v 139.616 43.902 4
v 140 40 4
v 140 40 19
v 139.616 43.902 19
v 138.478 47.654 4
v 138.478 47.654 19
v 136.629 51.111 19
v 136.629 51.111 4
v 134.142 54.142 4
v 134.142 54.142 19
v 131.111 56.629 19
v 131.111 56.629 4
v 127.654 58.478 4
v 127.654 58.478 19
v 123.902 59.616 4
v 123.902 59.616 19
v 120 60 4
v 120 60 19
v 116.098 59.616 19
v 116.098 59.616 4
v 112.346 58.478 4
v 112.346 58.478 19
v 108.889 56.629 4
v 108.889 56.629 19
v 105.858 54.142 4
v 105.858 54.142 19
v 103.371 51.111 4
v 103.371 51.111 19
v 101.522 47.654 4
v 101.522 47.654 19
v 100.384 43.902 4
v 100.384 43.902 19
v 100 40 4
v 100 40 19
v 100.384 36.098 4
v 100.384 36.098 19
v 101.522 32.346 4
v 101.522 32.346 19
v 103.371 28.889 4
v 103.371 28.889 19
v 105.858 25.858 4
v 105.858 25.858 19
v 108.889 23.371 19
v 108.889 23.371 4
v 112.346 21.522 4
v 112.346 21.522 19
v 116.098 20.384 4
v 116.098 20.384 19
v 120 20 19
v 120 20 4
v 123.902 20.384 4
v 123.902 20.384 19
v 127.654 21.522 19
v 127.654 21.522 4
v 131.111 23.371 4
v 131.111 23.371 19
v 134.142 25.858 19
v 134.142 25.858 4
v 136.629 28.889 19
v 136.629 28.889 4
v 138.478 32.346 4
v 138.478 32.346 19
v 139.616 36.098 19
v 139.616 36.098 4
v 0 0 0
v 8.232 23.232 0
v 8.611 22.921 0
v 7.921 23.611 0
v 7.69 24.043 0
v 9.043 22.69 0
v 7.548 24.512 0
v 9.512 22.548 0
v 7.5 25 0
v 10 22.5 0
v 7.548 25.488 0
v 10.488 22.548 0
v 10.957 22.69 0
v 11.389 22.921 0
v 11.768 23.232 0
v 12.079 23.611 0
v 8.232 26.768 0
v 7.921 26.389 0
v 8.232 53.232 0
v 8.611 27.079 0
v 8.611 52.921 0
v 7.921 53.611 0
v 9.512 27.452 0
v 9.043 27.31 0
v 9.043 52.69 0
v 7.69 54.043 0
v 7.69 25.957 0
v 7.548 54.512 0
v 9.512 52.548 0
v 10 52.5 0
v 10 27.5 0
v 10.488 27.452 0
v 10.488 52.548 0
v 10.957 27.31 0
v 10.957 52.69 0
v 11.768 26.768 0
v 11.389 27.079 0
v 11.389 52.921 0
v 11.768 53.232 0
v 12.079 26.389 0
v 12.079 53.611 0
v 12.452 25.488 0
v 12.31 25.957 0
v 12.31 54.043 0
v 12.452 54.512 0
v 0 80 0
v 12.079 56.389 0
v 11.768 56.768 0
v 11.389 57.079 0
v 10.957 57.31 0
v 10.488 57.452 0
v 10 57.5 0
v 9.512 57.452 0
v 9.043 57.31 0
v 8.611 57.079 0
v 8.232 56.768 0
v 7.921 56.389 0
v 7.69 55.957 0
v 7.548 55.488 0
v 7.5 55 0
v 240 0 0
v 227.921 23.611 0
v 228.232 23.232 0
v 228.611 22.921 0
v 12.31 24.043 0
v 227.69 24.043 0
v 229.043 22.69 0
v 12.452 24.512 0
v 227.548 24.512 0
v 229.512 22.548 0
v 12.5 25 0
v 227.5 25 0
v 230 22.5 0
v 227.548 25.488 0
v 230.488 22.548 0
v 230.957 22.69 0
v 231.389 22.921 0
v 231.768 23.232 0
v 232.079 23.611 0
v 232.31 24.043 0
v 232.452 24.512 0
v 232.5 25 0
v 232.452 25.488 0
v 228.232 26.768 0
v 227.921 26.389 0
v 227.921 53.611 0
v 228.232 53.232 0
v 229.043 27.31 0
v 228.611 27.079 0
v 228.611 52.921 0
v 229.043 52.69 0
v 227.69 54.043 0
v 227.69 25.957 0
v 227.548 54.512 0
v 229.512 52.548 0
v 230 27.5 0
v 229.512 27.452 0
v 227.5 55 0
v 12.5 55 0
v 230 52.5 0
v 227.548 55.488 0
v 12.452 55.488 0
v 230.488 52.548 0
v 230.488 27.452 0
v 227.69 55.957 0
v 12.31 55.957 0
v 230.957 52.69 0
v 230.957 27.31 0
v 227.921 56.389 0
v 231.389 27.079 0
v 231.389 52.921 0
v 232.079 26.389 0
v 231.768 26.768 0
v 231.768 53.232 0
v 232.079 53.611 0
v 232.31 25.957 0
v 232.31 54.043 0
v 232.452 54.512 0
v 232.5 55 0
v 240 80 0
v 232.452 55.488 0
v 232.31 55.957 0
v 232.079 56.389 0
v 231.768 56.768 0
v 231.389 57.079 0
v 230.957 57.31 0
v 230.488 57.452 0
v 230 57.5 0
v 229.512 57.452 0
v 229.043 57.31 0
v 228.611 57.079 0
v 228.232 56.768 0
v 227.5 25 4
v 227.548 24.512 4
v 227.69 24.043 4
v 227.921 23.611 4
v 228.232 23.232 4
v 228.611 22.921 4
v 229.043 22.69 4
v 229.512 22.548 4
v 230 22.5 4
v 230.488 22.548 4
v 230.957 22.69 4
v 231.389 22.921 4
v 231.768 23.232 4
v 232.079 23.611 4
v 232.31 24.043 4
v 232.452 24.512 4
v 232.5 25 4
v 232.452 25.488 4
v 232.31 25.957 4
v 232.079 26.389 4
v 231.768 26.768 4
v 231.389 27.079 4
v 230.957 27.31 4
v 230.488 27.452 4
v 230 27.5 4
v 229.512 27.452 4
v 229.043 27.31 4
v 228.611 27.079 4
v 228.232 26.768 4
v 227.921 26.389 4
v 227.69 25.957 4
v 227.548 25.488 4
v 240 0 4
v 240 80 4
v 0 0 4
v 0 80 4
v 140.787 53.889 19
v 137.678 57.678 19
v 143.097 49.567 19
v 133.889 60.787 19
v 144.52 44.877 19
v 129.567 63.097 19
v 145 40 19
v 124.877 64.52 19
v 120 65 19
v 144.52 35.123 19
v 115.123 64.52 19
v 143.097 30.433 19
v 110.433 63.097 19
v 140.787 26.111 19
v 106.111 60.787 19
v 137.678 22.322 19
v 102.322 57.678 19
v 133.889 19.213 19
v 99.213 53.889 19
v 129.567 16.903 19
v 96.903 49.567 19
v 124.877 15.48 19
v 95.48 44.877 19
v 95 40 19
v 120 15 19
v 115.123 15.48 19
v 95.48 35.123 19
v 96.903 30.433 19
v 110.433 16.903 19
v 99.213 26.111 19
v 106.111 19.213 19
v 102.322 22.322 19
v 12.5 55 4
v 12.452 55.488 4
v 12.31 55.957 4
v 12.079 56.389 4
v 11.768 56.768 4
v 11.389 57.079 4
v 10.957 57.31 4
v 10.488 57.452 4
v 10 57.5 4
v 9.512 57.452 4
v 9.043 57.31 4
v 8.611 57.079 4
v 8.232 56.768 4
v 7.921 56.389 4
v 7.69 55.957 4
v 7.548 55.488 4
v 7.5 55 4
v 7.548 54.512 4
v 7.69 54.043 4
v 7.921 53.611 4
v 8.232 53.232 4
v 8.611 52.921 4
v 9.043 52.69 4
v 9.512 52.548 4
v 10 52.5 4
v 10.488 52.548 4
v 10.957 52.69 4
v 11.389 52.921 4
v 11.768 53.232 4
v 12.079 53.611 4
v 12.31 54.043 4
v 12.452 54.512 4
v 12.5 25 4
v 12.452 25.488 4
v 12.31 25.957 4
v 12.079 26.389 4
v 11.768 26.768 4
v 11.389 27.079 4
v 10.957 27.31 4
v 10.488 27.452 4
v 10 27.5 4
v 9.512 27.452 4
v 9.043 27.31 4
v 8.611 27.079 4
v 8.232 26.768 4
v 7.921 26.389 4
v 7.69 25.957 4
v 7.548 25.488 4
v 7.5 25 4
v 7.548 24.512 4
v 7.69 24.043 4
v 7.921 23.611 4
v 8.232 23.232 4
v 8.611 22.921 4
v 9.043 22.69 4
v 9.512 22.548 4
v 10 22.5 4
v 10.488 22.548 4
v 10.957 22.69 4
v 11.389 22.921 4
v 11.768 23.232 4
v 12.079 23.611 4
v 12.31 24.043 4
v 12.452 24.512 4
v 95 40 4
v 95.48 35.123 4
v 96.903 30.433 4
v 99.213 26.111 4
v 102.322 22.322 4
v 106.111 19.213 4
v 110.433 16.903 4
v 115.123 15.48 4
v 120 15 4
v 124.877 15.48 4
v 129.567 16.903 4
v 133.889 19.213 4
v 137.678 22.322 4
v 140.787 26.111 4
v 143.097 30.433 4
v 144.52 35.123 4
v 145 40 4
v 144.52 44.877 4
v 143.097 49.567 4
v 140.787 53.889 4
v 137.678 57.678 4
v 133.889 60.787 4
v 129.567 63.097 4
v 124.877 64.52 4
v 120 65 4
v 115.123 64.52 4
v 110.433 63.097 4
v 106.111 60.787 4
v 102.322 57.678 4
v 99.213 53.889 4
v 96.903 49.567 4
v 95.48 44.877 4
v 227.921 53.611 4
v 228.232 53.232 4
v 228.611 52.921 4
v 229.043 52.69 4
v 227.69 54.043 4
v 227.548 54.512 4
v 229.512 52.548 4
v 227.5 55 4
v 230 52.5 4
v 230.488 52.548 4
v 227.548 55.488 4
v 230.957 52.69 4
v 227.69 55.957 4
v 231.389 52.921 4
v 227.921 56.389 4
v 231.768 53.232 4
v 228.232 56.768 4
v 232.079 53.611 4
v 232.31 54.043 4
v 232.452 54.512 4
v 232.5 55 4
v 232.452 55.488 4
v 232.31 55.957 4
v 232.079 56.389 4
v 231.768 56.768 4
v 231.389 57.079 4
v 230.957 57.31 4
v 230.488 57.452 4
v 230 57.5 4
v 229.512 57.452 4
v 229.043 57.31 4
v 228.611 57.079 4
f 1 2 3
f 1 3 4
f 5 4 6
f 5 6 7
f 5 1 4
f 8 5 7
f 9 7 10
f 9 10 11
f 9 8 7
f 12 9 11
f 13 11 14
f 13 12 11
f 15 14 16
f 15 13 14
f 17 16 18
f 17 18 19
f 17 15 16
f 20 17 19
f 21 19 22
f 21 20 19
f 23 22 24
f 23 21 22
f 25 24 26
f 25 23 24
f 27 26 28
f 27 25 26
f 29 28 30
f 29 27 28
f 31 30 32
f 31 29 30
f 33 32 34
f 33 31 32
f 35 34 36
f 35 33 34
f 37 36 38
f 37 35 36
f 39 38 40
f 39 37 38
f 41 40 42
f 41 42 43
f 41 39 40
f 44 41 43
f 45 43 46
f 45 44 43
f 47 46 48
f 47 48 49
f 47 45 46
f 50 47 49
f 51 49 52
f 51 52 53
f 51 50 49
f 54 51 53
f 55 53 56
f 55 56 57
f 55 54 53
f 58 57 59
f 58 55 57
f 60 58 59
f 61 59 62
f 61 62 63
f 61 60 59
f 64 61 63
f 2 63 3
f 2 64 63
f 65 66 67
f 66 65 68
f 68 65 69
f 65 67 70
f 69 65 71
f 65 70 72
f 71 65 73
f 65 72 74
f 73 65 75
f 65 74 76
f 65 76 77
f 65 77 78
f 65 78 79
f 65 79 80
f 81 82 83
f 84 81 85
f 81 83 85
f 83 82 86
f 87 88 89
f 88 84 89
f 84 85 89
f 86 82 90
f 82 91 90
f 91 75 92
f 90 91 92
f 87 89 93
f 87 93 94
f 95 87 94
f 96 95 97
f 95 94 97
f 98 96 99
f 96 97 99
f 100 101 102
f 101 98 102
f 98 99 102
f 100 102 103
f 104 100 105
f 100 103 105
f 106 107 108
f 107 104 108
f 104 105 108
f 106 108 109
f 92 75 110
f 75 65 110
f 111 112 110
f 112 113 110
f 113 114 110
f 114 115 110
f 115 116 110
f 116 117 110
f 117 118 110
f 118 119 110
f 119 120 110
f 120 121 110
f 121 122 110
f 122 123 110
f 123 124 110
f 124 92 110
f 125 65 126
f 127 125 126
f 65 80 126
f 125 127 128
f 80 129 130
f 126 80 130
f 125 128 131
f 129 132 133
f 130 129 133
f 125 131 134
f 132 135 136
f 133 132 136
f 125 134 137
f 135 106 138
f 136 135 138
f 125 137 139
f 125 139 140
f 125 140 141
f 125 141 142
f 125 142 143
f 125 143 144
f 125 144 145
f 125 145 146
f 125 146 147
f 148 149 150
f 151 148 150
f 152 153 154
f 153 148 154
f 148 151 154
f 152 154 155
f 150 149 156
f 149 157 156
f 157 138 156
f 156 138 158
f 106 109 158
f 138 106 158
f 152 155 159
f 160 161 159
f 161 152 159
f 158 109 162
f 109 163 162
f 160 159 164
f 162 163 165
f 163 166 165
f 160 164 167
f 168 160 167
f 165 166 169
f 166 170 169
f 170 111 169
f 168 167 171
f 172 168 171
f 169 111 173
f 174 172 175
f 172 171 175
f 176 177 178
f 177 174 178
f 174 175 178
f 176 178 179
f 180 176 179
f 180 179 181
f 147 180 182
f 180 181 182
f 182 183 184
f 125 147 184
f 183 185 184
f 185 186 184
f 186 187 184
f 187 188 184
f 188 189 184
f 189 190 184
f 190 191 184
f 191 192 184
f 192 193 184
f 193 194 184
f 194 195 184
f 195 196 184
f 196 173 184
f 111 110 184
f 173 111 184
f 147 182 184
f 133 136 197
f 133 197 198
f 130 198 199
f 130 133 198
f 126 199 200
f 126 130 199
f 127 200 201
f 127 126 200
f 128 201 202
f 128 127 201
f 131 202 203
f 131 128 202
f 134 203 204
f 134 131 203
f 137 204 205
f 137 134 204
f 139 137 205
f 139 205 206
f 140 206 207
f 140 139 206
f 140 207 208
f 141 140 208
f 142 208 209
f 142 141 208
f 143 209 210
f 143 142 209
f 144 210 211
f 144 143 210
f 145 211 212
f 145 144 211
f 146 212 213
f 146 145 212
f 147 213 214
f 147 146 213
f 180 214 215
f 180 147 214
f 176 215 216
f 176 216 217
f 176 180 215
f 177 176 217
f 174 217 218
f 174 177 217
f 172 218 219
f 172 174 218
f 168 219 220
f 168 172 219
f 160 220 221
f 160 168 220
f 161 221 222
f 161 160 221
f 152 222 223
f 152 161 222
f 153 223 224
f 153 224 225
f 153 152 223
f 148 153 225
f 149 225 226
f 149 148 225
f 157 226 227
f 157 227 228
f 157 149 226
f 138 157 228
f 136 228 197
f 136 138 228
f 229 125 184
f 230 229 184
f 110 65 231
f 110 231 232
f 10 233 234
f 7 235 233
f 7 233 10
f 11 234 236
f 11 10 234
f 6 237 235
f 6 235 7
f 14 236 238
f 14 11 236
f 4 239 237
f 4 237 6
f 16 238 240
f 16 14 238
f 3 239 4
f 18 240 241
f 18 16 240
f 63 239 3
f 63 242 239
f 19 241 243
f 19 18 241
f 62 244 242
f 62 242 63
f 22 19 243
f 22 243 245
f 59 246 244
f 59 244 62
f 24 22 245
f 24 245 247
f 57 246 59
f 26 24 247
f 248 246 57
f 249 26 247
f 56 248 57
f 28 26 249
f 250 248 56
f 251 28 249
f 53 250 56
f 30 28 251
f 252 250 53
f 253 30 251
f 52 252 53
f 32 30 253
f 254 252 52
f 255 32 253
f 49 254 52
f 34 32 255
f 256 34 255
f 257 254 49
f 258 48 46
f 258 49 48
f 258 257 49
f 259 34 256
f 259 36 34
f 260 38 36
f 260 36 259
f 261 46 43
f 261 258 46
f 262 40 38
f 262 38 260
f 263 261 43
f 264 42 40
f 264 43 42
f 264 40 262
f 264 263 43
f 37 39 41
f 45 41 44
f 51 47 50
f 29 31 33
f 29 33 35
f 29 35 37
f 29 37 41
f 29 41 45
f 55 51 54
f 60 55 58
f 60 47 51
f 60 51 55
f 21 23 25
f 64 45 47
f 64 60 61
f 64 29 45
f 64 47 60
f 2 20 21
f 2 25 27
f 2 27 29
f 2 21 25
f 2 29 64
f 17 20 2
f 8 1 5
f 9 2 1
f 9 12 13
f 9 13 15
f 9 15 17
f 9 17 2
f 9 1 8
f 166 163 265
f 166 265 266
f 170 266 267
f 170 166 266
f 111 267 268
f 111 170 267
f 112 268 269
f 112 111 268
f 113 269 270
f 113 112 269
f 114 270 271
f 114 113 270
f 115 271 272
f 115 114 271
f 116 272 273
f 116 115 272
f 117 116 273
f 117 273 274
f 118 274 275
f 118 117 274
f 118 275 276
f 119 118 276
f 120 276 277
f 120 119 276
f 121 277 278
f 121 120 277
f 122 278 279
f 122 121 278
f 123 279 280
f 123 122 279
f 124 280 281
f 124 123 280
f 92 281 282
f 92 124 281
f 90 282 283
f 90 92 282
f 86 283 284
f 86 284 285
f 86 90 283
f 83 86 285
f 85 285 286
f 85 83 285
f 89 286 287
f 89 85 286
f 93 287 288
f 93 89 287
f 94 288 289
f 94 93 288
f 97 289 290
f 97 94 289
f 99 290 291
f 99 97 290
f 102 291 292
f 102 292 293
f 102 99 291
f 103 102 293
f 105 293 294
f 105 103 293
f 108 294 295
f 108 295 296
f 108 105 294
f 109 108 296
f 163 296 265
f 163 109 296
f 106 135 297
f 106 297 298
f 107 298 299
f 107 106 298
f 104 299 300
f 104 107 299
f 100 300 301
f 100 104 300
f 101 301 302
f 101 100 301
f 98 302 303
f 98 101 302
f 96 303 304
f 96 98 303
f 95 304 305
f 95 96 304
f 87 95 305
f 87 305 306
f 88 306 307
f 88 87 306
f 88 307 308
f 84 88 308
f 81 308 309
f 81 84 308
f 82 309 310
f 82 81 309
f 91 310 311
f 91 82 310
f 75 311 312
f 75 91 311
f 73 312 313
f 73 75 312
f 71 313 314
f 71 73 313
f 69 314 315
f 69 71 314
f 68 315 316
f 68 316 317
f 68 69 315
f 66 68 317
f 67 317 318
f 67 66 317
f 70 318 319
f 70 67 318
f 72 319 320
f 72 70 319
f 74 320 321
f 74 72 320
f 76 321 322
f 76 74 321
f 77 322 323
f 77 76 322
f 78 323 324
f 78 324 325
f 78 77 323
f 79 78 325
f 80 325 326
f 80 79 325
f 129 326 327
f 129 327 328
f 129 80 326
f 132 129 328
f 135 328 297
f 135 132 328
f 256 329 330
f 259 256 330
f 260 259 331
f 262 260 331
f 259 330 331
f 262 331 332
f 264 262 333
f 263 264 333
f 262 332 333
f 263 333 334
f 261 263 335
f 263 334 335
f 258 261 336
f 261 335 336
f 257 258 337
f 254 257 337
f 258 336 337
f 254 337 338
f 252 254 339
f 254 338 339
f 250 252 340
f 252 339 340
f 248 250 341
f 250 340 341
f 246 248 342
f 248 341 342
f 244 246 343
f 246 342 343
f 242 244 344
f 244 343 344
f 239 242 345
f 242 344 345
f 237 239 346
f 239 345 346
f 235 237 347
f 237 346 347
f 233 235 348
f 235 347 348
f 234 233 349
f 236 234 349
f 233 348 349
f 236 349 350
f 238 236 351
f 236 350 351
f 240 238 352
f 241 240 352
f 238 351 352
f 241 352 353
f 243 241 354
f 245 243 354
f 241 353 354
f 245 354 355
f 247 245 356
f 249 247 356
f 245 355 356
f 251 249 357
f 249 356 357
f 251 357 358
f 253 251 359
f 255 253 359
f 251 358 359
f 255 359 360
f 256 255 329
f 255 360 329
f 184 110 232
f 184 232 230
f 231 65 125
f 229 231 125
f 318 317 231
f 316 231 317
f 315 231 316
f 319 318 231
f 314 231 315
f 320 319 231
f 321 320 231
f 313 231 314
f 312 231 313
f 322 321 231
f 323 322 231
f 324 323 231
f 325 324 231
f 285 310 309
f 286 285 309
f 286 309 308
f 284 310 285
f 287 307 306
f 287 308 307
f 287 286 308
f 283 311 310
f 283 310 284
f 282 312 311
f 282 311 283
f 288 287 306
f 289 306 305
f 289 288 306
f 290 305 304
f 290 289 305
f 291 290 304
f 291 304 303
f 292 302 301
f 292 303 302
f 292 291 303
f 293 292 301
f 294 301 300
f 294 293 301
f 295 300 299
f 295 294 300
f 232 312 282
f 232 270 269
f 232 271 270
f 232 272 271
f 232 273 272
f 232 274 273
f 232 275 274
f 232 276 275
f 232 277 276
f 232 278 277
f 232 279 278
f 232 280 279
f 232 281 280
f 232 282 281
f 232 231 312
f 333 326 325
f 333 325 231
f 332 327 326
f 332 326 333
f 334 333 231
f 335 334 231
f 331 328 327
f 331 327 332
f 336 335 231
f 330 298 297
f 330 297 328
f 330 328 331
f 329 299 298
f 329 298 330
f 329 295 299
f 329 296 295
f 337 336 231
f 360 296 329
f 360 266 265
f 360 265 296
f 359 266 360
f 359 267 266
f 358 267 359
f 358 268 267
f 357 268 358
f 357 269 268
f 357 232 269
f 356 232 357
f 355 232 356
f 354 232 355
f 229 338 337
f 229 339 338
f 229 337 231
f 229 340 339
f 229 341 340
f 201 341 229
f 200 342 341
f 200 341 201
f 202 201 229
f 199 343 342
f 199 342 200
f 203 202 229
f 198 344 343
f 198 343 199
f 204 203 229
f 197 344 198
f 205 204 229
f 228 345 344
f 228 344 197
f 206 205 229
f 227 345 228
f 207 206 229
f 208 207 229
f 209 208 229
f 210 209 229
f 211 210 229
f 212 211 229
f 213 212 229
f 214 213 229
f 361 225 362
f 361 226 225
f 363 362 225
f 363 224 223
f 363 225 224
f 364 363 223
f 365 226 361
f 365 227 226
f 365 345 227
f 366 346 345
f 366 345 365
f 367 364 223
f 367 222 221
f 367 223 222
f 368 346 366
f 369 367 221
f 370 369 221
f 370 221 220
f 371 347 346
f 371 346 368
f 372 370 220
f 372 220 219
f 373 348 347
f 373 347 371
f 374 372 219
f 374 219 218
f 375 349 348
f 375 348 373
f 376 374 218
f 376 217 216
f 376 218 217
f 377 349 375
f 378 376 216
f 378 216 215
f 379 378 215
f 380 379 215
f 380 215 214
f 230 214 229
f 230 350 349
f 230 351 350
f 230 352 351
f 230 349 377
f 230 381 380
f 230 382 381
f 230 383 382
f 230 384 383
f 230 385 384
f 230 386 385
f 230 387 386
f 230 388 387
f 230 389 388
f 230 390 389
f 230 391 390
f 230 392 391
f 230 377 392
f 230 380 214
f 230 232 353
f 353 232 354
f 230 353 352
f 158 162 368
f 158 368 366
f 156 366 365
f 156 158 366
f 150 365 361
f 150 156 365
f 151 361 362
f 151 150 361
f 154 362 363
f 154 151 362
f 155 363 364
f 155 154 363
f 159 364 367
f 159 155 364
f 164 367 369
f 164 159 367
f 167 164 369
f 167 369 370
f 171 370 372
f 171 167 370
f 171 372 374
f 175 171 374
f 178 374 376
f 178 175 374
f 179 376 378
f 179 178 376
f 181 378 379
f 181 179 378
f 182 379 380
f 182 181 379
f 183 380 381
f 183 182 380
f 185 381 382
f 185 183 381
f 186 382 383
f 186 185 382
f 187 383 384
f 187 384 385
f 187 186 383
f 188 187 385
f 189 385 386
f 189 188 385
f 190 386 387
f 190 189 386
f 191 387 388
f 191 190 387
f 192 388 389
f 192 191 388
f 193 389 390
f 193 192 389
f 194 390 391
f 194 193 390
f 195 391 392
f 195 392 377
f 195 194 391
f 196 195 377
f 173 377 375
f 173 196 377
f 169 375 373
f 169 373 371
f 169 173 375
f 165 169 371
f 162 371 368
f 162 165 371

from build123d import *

# Parameters (mm, degrees)
ESQUISSE1_W        = 240
ESQUISSE1_H        = 80
ESQUISSE1_R        = 2.5
BOSS_EXTRU_1_DEPTH = 4
ESQUISSE2_R        = 25
ESQUISSE2_R_2      = 20
BOSS_EXTRU_2_DEPTH = 15


with BuildPart() as part:
    # Esquisse1 → Boss.-Extru.1 (new body)
    with BuildSketch(Plane.XY):
        with Locations((120, 40)):
            Rectangle(ESQUISSE1_W, ESQUISSE1_H)
        with Locations((10, 55)):
            Circle(ESQUISSE1_R, mode=Mode.SUBTRACT)
        with Locations((10, 25)):
            Circle(ESQUISSE1_R, mode=Mode.SUBTRACT)
        with Locations(Location((230, 25, 0), (0, 0, 180))):
            Circle(ESQUISSE1_R, mode=Mode.SUBTRACT)
        with Locations(Location((230, 55, 0), (0, 0, 180))):
            Circle(ESQUISSE1_R, mode=Mode.SUBTRACT)
    extrude(amount=BOSS_EXTRU_1_DEPTH)

    # Esquisse2 → Boss.-Extru.2 (add)
    with BuildSketch(Plane.XY.offset(4)):
        with Locations(Location((120, 40, 0), (0, 0, 180))):
            Circle(ESQUISSE2_R)
        with Locations((120, 40)):
            Circle(ESQUISSE2_R_2, mode=Mode.SUBTRACT)
    extrude(amount=BOSS_EXTRU_2_DEPTH)


solid = part.part
